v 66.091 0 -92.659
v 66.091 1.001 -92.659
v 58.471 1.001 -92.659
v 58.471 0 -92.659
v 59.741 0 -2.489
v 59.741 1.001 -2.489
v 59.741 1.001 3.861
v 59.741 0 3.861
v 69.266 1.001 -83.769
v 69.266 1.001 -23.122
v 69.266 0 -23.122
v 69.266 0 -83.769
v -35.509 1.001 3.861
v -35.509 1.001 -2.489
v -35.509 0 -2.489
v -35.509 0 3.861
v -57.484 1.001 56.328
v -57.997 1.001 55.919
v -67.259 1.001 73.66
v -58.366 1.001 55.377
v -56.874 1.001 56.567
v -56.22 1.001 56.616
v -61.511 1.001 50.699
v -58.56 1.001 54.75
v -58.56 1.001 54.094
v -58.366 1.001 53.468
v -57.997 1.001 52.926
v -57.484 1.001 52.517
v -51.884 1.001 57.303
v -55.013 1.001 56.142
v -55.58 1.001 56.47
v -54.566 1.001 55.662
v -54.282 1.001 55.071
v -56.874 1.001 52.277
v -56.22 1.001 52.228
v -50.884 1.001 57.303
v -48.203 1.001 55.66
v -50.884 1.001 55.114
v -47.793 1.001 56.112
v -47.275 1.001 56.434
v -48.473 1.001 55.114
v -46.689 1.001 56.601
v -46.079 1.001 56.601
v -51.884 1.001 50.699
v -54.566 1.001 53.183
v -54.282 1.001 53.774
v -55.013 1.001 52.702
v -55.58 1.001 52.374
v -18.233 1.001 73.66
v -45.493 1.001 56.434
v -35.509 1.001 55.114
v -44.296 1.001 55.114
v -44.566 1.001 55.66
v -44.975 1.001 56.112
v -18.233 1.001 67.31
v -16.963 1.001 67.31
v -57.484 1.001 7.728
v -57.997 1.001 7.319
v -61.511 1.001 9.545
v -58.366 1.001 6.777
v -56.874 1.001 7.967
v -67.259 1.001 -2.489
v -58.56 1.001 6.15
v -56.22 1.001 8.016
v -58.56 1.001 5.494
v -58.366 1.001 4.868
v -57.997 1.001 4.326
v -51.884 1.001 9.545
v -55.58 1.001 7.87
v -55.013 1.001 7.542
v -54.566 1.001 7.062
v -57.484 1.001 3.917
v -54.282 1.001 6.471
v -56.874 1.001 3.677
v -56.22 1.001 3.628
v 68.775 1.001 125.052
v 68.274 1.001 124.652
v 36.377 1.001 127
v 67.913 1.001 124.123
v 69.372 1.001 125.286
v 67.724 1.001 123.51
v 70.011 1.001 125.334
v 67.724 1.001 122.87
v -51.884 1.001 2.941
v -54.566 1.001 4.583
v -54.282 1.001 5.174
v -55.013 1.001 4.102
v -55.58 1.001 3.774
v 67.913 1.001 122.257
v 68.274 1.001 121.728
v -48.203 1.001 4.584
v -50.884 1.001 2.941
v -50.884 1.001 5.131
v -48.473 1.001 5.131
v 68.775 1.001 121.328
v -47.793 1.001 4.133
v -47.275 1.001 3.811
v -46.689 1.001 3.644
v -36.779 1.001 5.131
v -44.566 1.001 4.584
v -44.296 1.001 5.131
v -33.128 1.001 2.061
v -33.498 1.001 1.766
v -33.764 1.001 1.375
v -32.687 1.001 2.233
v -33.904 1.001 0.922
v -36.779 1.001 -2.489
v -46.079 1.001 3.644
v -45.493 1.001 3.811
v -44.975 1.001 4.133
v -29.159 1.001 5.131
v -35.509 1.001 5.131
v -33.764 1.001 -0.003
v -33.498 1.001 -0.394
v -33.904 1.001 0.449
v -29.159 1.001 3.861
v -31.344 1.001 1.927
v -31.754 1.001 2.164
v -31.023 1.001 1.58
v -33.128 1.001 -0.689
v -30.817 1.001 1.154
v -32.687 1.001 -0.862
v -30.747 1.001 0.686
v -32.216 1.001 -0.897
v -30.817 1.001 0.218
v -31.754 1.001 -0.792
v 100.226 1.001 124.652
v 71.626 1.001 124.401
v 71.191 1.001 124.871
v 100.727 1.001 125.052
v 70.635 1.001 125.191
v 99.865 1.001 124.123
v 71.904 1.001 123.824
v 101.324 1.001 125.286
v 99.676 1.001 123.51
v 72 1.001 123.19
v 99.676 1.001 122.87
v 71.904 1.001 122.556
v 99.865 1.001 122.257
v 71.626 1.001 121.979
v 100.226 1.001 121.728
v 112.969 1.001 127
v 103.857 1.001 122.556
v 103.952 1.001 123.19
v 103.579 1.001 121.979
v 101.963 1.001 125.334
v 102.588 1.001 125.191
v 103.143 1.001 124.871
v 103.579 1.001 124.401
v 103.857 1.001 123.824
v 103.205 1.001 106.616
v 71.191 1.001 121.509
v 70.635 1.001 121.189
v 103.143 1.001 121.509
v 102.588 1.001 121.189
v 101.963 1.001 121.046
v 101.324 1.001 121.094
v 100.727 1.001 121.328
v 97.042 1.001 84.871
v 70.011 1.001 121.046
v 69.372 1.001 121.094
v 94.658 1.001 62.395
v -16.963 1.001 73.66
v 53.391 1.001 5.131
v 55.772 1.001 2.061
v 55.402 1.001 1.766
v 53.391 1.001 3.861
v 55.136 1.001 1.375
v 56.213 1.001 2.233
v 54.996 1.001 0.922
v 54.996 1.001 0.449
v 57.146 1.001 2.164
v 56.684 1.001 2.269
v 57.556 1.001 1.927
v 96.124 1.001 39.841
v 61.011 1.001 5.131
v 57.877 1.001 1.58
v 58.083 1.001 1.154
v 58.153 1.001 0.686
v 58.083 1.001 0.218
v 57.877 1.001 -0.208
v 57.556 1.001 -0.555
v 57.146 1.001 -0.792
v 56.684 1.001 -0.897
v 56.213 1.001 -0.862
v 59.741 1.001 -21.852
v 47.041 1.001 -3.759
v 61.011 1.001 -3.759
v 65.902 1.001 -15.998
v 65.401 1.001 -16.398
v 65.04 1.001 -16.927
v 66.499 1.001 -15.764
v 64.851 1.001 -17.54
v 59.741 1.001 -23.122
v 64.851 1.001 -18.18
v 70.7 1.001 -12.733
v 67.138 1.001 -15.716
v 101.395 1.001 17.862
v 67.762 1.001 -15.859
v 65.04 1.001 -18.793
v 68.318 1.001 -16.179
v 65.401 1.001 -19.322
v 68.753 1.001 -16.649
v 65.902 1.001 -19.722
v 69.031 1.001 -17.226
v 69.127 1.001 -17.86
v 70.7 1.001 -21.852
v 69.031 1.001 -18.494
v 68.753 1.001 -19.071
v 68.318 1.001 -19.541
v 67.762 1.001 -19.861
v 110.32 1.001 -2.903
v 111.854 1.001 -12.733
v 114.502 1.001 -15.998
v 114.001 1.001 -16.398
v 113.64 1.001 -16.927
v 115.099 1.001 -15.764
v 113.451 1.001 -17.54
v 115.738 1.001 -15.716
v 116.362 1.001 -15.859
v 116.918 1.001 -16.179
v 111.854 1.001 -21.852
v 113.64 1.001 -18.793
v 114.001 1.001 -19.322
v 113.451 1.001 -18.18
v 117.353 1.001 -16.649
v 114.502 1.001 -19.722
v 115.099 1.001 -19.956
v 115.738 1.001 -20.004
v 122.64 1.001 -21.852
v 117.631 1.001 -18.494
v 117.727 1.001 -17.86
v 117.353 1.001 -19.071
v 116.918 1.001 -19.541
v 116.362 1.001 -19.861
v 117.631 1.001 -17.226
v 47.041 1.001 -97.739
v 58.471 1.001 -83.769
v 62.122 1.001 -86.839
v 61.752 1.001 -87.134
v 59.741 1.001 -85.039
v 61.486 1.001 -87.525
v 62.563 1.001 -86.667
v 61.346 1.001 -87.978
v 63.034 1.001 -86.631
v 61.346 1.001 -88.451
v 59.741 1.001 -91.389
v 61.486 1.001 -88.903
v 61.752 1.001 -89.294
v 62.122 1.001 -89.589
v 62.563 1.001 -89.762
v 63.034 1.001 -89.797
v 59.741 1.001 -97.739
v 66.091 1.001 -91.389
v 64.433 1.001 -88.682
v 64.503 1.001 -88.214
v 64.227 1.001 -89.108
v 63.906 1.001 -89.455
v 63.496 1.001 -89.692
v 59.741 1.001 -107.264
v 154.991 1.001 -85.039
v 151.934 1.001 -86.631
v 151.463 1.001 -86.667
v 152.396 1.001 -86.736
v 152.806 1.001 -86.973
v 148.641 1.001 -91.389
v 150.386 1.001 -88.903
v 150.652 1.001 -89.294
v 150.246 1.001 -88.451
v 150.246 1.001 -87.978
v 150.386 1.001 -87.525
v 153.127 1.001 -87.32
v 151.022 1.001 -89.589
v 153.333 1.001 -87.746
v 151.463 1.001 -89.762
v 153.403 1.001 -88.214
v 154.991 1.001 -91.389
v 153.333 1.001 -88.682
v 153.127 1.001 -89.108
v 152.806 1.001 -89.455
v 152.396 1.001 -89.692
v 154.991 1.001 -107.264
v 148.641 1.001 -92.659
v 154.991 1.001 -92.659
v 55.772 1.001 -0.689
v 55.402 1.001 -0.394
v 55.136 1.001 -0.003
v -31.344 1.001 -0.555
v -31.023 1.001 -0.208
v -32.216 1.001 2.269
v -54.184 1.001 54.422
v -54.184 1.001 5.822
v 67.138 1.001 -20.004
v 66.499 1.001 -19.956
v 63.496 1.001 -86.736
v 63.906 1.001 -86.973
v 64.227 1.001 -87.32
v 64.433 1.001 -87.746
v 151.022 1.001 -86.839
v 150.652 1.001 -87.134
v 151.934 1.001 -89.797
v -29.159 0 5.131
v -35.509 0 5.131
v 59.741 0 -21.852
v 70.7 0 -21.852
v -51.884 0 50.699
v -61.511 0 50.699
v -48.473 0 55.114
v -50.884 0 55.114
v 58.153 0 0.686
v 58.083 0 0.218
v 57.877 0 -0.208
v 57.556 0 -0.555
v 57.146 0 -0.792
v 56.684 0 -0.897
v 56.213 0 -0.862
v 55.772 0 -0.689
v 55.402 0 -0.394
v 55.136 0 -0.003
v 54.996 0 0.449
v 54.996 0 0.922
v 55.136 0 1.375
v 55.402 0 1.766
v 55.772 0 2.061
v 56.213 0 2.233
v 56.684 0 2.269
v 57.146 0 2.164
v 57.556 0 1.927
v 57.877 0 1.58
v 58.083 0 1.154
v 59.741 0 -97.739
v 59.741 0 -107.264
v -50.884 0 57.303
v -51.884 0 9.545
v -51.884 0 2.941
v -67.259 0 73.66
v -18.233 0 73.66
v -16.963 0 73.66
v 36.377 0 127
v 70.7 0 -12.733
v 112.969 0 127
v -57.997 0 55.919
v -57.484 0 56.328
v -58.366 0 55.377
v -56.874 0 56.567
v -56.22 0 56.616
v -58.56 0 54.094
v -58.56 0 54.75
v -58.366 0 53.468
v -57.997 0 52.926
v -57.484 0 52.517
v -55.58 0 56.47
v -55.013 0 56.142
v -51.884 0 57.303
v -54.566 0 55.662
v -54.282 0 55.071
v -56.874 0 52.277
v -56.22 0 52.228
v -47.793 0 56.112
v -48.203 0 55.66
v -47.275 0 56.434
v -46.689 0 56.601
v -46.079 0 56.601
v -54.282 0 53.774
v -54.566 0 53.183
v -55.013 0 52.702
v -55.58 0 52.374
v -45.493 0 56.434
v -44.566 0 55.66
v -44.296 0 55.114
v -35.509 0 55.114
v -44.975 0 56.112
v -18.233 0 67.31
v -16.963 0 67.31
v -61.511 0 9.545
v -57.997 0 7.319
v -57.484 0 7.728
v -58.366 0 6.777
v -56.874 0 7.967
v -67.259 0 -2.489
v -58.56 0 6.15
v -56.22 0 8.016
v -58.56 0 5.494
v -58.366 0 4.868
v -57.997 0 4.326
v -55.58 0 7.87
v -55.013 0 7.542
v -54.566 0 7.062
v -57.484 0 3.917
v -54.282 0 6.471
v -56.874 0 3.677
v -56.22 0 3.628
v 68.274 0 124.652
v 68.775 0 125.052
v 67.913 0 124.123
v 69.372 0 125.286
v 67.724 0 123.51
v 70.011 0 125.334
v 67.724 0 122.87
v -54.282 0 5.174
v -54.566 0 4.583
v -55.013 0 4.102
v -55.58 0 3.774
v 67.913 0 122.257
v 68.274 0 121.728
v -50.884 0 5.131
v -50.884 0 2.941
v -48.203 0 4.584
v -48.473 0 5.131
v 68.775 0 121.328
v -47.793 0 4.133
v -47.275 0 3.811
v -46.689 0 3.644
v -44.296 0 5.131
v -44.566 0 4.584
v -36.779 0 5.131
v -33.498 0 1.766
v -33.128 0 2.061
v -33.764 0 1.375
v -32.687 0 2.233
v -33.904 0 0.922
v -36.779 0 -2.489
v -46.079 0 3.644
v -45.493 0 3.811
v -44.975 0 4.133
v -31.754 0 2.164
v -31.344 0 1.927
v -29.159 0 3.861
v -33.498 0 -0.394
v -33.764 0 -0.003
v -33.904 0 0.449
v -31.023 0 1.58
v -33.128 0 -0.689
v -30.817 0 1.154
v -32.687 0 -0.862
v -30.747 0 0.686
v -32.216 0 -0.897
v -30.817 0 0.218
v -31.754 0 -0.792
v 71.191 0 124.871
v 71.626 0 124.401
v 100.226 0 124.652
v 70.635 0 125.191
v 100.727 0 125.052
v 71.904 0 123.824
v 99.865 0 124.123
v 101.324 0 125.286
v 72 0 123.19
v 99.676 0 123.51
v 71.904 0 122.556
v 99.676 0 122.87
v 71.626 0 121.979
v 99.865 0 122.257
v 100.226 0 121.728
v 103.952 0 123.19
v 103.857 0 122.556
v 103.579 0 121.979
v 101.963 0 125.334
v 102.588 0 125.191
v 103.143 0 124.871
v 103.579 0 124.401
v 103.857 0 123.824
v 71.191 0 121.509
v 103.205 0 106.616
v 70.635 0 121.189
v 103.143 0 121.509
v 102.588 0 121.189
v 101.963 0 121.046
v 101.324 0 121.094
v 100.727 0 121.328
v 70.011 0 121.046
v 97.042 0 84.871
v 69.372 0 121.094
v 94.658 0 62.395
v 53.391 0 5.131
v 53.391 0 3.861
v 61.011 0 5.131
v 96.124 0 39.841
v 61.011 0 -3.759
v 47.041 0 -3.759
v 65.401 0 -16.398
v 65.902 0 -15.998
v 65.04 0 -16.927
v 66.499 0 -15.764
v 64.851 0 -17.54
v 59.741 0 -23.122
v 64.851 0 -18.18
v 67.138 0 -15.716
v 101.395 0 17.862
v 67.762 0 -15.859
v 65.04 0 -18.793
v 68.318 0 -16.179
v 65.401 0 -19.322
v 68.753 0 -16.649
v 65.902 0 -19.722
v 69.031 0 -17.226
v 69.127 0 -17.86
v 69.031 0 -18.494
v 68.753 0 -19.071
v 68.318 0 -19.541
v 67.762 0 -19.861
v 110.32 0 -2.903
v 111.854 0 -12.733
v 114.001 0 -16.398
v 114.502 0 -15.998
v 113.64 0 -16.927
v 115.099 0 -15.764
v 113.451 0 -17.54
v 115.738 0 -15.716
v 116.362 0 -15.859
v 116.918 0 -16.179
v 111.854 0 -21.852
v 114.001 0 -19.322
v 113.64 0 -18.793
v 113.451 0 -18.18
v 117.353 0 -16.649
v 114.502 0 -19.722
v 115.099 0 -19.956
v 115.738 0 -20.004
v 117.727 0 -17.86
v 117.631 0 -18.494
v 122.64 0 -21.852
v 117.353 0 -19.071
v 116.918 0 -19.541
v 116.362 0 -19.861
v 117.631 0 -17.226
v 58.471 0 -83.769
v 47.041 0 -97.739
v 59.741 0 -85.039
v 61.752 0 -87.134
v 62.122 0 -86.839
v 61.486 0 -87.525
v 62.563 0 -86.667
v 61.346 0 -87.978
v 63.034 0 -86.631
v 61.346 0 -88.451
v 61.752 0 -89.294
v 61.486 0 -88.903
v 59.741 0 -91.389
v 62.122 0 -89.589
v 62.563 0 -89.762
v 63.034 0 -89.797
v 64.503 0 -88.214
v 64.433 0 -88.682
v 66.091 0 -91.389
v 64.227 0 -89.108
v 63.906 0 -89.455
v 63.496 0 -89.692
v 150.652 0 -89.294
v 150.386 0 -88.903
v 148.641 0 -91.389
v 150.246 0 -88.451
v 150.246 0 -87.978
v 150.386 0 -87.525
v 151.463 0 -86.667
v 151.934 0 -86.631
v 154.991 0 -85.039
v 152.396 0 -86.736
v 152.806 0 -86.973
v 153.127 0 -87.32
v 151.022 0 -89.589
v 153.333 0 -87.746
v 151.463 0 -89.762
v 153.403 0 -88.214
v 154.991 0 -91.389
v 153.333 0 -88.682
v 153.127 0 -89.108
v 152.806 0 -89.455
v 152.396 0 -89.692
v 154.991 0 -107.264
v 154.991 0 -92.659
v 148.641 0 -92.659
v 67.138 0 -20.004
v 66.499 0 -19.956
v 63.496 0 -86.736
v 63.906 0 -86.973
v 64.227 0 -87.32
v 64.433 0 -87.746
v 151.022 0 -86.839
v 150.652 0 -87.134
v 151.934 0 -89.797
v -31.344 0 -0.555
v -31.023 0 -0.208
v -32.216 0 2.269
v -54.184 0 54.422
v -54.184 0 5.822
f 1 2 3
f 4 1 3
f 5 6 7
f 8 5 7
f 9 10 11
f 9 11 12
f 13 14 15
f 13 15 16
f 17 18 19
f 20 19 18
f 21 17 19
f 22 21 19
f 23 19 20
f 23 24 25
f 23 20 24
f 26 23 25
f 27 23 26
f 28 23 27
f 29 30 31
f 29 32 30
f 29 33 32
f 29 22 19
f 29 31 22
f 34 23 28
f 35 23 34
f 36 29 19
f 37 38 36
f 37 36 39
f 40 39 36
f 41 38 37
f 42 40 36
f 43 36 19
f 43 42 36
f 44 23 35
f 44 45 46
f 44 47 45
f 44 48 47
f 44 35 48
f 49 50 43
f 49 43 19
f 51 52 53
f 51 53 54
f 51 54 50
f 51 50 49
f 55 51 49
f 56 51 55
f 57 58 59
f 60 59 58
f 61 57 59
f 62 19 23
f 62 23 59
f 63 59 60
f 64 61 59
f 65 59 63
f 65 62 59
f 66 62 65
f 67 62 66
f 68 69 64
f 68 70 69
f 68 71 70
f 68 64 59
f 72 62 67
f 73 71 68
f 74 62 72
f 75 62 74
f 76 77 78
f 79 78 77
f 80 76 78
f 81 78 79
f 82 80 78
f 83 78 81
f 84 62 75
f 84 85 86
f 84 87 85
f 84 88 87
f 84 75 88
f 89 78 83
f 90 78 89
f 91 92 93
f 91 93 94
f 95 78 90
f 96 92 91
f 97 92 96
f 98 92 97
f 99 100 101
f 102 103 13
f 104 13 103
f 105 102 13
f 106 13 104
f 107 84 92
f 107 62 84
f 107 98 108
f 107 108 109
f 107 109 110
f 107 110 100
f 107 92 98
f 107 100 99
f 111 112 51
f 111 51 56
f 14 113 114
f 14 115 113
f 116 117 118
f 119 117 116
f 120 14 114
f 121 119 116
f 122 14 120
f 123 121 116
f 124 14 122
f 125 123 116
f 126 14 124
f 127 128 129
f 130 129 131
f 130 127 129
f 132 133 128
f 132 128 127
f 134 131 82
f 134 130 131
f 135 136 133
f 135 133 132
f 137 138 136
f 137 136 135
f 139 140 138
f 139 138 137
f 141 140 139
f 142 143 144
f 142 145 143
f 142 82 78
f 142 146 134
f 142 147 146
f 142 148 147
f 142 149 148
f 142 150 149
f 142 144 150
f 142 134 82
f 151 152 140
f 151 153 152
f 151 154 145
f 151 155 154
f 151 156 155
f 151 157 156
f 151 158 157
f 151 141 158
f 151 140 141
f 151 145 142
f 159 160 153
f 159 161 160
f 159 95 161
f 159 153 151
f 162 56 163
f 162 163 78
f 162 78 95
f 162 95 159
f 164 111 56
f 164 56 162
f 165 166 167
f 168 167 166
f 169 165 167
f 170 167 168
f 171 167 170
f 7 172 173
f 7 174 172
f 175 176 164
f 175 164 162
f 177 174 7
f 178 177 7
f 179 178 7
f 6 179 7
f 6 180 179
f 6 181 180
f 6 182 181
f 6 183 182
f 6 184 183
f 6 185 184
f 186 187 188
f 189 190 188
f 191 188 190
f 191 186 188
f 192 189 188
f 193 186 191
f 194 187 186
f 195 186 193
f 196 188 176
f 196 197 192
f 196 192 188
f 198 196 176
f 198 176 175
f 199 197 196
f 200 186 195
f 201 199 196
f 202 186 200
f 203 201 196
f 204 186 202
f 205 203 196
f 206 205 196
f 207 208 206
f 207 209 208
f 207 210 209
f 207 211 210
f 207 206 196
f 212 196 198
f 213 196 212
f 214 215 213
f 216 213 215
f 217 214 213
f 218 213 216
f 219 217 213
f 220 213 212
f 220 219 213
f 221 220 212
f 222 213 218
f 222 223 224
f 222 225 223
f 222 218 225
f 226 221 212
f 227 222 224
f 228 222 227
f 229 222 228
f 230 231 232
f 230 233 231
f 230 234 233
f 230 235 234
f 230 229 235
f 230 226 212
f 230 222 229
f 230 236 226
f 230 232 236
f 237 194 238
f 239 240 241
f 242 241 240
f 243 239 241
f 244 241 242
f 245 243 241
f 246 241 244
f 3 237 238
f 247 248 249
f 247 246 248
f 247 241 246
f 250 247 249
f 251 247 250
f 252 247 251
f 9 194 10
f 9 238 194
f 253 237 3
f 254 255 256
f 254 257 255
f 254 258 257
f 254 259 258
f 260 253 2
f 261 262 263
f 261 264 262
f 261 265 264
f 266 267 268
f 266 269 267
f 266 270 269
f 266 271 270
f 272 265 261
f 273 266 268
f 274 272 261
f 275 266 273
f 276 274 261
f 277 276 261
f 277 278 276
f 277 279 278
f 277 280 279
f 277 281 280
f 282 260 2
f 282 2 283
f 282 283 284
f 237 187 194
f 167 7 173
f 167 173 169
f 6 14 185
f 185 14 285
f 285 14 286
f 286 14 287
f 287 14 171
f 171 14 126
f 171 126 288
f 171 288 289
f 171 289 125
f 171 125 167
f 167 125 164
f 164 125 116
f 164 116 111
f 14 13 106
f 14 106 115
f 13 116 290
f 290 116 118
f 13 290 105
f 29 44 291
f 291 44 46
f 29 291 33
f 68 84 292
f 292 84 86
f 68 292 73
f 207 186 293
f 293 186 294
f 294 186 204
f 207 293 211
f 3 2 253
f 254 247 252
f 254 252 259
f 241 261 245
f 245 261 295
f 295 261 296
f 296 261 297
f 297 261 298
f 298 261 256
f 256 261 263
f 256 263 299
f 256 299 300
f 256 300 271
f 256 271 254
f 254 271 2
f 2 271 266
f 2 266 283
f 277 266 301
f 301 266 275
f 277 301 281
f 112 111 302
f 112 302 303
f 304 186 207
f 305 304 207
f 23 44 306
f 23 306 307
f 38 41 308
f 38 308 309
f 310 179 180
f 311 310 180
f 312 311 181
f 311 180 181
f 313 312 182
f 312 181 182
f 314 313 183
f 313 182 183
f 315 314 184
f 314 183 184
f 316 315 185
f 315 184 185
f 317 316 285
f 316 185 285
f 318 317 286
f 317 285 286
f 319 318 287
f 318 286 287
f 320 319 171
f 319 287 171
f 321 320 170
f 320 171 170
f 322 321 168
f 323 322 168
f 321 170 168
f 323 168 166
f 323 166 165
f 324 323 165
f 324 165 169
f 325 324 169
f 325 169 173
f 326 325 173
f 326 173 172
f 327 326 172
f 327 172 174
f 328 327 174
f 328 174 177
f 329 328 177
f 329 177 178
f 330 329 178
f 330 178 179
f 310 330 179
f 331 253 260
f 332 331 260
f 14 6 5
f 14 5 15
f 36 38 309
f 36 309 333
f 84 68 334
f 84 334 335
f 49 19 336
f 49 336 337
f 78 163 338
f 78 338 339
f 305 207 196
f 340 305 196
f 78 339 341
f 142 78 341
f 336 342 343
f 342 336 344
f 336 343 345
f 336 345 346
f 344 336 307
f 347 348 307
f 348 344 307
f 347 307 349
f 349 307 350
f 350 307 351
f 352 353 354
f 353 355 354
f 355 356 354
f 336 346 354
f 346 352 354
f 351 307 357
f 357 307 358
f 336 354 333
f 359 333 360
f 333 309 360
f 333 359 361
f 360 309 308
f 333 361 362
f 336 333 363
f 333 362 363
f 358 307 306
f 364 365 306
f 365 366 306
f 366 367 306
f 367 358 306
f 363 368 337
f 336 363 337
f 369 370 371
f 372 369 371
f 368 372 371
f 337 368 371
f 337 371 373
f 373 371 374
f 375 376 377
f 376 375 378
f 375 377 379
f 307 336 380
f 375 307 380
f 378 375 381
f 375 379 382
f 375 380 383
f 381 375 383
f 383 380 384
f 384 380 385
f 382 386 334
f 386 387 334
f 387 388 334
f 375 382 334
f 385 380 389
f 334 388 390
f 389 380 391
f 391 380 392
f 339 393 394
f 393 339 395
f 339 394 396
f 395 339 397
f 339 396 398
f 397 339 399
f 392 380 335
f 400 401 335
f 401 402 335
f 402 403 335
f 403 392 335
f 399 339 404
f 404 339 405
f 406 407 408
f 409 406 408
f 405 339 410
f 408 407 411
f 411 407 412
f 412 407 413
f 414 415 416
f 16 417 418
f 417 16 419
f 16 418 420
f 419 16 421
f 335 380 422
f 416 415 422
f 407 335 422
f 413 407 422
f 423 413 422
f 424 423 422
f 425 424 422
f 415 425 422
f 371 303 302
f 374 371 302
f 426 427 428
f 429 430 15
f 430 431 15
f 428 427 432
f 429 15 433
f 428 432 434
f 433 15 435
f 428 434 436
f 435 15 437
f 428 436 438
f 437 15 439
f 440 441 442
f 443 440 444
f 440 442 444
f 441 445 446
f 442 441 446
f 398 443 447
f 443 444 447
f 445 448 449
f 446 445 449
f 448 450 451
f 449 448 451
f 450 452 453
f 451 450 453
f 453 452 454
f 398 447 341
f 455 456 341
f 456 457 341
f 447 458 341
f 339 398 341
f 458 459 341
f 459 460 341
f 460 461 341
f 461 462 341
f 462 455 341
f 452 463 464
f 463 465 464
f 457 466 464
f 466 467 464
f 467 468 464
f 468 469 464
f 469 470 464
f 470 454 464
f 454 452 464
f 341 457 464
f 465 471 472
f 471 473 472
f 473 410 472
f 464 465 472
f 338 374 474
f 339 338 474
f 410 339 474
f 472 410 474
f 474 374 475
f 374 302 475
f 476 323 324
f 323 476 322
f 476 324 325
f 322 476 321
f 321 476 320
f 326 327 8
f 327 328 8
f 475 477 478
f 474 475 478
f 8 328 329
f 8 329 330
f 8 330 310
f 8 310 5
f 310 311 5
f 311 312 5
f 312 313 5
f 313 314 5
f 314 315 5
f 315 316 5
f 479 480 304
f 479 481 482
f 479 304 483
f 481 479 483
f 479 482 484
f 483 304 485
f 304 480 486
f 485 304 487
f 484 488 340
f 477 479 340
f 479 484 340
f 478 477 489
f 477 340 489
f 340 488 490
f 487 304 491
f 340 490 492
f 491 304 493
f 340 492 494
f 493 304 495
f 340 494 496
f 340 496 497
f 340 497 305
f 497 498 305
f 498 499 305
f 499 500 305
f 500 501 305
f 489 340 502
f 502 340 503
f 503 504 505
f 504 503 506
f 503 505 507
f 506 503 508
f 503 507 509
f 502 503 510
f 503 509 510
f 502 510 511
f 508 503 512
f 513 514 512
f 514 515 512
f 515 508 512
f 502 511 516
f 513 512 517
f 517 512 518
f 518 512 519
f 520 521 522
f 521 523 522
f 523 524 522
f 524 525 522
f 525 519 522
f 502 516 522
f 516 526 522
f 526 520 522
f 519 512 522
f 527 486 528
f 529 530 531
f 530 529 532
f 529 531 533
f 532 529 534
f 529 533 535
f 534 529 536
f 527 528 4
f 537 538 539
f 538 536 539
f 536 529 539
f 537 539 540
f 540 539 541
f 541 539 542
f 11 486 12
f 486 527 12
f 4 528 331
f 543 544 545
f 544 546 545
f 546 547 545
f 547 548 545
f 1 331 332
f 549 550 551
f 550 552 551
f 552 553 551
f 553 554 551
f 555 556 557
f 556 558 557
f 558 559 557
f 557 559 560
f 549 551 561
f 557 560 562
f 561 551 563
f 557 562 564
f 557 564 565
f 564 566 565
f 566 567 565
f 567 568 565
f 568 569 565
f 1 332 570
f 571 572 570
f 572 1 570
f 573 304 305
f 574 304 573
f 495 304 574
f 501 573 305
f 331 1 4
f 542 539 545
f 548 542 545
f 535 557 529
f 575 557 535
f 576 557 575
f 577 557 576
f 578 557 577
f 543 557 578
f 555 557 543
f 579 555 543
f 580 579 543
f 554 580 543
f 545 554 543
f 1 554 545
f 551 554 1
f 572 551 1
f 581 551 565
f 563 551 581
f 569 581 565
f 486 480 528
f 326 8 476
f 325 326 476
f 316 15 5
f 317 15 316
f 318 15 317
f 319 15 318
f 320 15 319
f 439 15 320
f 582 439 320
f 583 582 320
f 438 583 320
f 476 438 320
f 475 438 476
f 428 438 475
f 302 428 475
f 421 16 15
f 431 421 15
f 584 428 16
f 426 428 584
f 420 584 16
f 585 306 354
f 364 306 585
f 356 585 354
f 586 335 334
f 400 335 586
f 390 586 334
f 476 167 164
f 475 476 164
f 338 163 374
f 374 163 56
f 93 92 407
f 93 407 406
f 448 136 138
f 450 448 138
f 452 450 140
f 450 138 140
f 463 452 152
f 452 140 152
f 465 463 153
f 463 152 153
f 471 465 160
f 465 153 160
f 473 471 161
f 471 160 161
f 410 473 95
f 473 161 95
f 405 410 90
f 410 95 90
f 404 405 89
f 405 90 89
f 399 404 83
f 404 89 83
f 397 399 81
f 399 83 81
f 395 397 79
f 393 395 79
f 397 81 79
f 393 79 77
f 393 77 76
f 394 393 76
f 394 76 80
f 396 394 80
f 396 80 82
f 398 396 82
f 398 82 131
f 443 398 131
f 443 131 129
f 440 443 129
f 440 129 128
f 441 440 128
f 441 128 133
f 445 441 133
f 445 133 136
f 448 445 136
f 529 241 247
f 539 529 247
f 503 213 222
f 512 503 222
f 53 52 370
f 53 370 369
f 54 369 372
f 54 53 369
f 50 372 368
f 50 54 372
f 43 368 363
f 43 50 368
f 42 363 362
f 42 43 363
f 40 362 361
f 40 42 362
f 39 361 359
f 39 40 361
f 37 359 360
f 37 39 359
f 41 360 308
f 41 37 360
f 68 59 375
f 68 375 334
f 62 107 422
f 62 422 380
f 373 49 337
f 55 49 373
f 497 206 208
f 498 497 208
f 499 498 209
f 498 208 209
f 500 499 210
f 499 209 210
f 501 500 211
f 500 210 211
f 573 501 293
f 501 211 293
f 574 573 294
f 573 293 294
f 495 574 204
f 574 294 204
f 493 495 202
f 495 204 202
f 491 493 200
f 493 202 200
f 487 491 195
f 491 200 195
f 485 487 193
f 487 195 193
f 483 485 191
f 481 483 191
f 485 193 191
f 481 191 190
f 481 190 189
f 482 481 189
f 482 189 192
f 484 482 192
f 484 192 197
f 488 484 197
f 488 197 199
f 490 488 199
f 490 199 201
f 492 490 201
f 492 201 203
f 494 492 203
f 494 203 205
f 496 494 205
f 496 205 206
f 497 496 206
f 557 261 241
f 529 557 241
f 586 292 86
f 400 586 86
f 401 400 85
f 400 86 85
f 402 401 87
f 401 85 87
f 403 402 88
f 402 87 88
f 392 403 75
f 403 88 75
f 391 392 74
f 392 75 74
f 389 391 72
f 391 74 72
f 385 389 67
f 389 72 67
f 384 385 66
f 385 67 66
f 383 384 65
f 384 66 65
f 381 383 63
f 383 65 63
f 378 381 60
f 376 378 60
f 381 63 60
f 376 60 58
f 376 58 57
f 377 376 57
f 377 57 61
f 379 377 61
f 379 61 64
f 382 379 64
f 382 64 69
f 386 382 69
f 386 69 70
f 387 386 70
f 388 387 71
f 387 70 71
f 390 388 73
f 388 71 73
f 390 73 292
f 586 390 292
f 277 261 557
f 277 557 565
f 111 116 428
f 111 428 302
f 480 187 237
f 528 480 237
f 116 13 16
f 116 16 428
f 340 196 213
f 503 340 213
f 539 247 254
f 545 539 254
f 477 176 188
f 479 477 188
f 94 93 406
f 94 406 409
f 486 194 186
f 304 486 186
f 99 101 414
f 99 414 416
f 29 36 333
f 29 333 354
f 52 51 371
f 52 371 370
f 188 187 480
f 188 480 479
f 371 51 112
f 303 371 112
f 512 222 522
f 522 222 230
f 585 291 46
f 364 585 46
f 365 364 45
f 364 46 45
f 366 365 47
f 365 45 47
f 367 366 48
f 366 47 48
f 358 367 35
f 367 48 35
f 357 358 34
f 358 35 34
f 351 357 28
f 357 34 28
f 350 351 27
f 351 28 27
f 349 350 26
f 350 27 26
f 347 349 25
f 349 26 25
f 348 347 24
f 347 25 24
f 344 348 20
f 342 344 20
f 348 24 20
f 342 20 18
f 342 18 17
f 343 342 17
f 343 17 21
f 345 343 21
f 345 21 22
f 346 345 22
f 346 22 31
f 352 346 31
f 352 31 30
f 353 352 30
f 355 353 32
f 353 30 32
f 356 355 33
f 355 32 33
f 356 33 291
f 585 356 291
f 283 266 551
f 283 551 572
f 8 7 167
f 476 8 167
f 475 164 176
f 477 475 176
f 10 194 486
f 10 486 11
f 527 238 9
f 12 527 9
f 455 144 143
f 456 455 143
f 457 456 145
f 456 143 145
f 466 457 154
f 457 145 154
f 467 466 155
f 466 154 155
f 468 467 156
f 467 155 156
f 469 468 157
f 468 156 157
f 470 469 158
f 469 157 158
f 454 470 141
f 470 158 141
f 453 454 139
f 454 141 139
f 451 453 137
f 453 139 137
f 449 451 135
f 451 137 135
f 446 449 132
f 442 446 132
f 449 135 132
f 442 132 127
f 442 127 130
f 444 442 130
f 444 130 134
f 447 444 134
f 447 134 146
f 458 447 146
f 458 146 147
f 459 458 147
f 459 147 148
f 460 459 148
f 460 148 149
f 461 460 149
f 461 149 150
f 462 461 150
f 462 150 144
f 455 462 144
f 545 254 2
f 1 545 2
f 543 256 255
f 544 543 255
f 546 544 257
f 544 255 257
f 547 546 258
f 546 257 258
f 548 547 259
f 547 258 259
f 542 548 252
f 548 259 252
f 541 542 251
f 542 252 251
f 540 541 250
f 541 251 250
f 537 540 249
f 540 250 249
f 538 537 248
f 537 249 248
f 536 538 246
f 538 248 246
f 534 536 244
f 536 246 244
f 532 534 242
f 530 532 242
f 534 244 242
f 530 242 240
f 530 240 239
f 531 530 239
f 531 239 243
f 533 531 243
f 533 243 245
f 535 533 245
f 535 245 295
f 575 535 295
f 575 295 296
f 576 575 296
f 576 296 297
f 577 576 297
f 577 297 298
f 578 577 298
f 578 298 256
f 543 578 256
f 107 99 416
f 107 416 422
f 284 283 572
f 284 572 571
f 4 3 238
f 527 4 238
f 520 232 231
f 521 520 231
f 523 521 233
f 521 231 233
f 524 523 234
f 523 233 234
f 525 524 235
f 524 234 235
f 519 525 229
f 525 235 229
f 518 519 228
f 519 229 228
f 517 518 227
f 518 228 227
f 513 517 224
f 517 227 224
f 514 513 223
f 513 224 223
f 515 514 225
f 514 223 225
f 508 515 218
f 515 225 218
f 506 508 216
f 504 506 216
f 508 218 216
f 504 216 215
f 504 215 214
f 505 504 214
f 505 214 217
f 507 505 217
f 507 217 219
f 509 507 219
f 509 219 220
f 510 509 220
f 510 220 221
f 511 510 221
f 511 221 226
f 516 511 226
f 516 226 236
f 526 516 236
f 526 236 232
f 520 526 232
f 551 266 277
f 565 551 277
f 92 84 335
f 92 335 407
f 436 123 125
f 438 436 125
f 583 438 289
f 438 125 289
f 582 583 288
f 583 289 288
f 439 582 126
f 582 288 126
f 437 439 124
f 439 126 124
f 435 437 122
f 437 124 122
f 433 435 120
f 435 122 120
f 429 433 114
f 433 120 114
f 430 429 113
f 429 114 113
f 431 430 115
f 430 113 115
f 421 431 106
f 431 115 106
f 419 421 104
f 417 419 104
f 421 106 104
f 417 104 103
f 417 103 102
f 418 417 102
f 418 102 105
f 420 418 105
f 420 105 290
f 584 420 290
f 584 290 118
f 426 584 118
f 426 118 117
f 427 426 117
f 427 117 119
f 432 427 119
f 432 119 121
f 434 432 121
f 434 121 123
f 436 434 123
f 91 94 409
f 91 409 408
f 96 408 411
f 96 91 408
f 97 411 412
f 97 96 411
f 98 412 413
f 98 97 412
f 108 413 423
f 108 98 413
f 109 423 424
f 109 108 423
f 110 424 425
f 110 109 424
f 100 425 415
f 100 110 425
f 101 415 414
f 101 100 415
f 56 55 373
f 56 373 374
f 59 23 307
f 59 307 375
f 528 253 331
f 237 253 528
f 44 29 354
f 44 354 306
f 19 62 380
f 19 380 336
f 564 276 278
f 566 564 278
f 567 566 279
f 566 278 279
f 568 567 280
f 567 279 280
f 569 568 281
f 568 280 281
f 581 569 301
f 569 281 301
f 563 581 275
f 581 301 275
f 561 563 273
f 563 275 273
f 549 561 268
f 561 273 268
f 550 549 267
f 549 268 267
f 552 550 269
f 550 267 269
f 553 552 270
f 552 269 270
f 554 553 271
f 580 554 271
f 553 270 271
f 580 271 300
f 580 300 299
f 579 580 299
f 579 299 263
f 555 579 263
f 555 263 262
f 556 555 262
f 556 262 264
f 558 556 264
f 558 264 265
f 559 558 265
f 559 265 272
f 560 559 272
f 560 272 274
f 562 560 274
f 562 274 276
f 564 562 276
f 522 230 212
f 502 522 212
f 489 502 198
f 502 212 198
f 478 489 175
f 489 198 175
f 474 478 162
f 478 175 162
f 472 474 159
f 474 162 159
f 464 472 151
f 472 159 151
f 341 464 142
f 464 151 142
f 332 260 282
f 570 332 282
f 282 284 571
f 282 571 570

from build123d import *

# Parameters (mm, degrees)
SKETCH2_W                    = 254
SKETCH2_H                    = 254
BOSS_EXTRUDE1_DEPTH          = 1.00076
SKETCH3_W                    = 69.85
SKETCH3_H                    = 25.4
CUT_EXTRUDE1_DEPTH           = 1
CUT_EXTRUDE1_DEPTH_BACK      = 2.00076
CUT_EXTRUDE2_DEPTH           = 1
CUT_EXTRUDE2_DEPTH_BACK      = 2.00076
SKETCH5_R                    = 2.150000018
CUT_EXTRUDE3_DEPTH           = 1
CUT_EXTRUDE3_DEPTH_BACK      = 2.00076
SKETCH6_R                    = 2.099999991
CUT_EXTRUDE4_DEPTH           = 1
CUT_EXTRUDE4_DEPTH_BACK      = 2.00076
SKETCH7_W                    = 95.25
SKETCH7_H                    = 95.25
CUT_EXTRUDE5_DEPTH           = 1
CUT_EXTRUDE5_DEPTH_BACK      = 2.00076
CUT_EXTRUDE6_DEPTH           = 1
CUT_EXTRUDE6_DEPTH_BACK      = 2.00076
BOSS_EXTRUDE4_DEPTH          = 1.00076
SKETCH18_W                   = 12.7
SKETCH18_H                   = 1.27
CUT_EXTRUDE_THIN4_DEPTH      = 1
CUT_EXTRUDE_THIN4_DEPTH_BACK = 2.00076
CUT_EXTRUDE7_DEPTH           = 1
CUT_EXTRUDE7_DEPTH_BACK      = 2.00076
SKETCH10_W                   = 9.525
SKETCH10_H                   = 60.6472
SKETCH10_W_2                 = 95.25
SKETCH10_H_2                 = 9.525
BOSS_EXTRUDE2_DEPTH          = 1.00076
SKETCH14_R                   = 2.200000045
BOSS_EXTRUDE3_DEPTH          = 1.00076
SKETCH15_W                   = 1.27
SKETCH15_H                   = 6.35
CUT_EXTRUDE_THIN3_DEPTH      = 1
CUT_EXTRUDE_THIN3_DEPTH_BACK = 2.00076
SKETCH19_R                   = 1.5875
CUT_EXTRUDE8_DEPTH           = 1
CUT_EXTRUDE8_DEPTH_BACK      = 2.00076
SKETCH20_W                   = 1.27
SKETCH20_H                   = 1.27
SKETCH20_W_2                 = 6.35
CUT_EXTRUDE12_DEPTH          = 1
CUT_EXTRUDE12_DEPTH_BACK     = 2.00076


with BuildPart() as part:
    # Sketch2 → Boss-Extrude1 (new body)
    with BuildSketch(Plane(origin=(0, 0, 0), x_dir=(1, 0, 0), z_dir=(0, 1, 0))):
        Rectangle(SKETCH2_W, SKETCH2_H)
    extrude(amount=BOSS_EXTRUDE1_DEPTH)

    # Sketch3 → Cut-Extrude1 (cut, two sides)
    with BuildSketch(Plane(origin=(0, 1.00076, 0), x_dir=(1, 0, 0), z_dir=(0, 1, 0))) as cut_extrude1_sk:
        with Locations((92.075, 34.552)):
            Rectangle(SKETCH3_W, SKETCH3_H)
    extrude(amount=CUT_EXTRUDE1_DEPTH, mode=Mode.SUBTRACT)
    extrude(cut_extrude1_sk.sketch, amount=-CUT_EXTRUDE1_DEPTH_BACK, mode=Mode.SUBTRACT)

    # Sketch4 → Cut-Extrude2 (cut, two sides)
    with BuildSketch(Plane(origin=(0, 1.00076, 0), x_dir=(1, 0, 0), z_dir=(0, 1, 0))) as cut_extrude2_sk:
        with BuildLine():
            Line((127, -127), (127, 21.852))
            Line((127, 21.852), (122.640015225, 21.852))
            ThreePointArc((122.640015225, 21.852), (94.909945844, -51.086516198), (112.96892893, -127))
            Line((112.96892893, -127), (127, -127))
        make_face()
    extrude(amount=CUT_EXTRUDE2_DEPTH, mode=Mode.SUBTRACT)
    extrude(cut_extrude2_sk.sketch, amount=-CUT_EXTRUDE2_DEPTH_BACK, mode=Mode.SUBTRACT)

    # Sketch5 → Cut-Extrude3 (cut, two sides)
    with BuildSketch(Plane(origin=(0, 1.00076, 0), x_dir=(1, 0, 0), z_dir=(0, 1, 0))) as cut_extrude3_sk:
        with Locations((69.85, -123.19)):
            Circle(SKETCH5_R)
        with Locations((101.802396213, -123.19)):
            Circle(SKETCH5_R)
        with Locations((66.977000031, 17.859999967)):
            Circle(SKETCH5_R)
        with Locations((115.577000113, 17.859999967)):
            Circle(SKETCH5_R)
    extrude(amount=CUT_EXTRUDE3_DEPTH, mode=Mode.SUBTRACT)
    extrude(cut_extrude3_sk.sketch, amount=-CUT_EXTRUDE3_DEPTH_BACK, mode=Mode.SUBTRACT)

    # Sketch6 → Cut-Extrude4 (cut, two sides)
    with BuildSketch(Plane(origin=(0, 1.00076, 0), x_dir=(1, 0, 0), z_dir=(0, 1, 0))) as cut_extrude4_sk:
        with Locations((66.977000031, 27.860000033)):
            Circle(SKETCH6_R)
        with Locations((66.977000031, 17.859999967)):
            Circle(SKETCH6_R)
        with Locations((115.577000113, 27.860000033)):
            Circle(SKETCH6_R)
        with Locations((115.577000113, 17.859999967)):
            Circle(SKETCH6_R)
        Polygon((70.700000078, 22.36), (70.700000078, 12.733000061), (111.854000066, 12.733000061), (111.854000066, 22.36), (118.458000066, 22.36), (118.458000066, 23.36), (111.854000066, 23.36), (111.854000066, 32.986999939), (70.700000078, 32.986999939), (70.700000078, 23.36), (64.096000078, 23.36), (64.096000078, 22.36), align=None)
    extrude(amount=CUT_EXTRUDE4_DEPTH, mode=Mode.SUBTRACT)
    extrude(cut_extrude4_sk.sketch, amount=-CUT_EXTRUDE4_DEPTH_BACK, mode=Mode.SUBTRACT)

    # Sketch7 → Cut-Extrude5 (cut, two sides)
    with BuildSketch(Plane(origin=(0, 1.00076, 0), x_dir=(1, 0, 0), z_dir=(0, 1, 0))) as cut_extrude5_sk:
        with Locations((12.1158, 50.1142)):
            Rectangle(SKETCH7_W, SKETCH7_H)
    extrude(amount=CUT_EXTRUDE5_DEPTH, mode=Mode.SUBTRACT)
    extrude(cut_extrude5_sk.sketch, amount=-CUT_EXTRUDE5_DEPTH_BACK, mode=Mode.SUBTRACT)

    # Sketch8 → Cut-Extrude6 (cut, two sides)
    with BuildSketch(Plane(origin=(0, 1.00076, 0), x_dir=(1, 0, 0), z_dir=(0, 1, 0))) as cut_extrude6_sk:
        Polygon((127, 47.252), (127, 127), (-127, 127), (-127, -127), (-35.5092, -127), (-35.5092, 47.252), align=None)
    extrude(amount=CUT_EXTRUDE6_DEPTH, mode=Mode.SUBTRACT)
    extrude(cut_extrude6_sk.sketch, amount=-CUT_EXTRUDE6_DEPTH_BACK, mode=Mode.SUBTRACT)

    # Sketch17 → Boss-Extrude4 (add)
    with BuildSketch(Plane(origin=(0, 1.00076, 0), x_dir=(1, 0, 0), z_dir=(0, 1, 0))):
        Polygon((59.7408, 2.4892), (47.0408, 2.4892), (47.0408, 97.7392), (59.7408, 97.7392), (154.9908, 97.7392), (154.9908, 85.0392), (59.7408, 85.0392), align=None)
    extrude(amount=-BOSS_EXTRUDE4_DEPTH)

    # Sketch18 → Cut-Extrude-Thin4 (cut, two sides)
    with BuildSketch(Plane(origin=(0, 1.00076, 0), x_dir=(1, 0, 0), z_dir=(0, 1, 0))) as cut_extrude_thin4_sk:
        with Locations((53.3908, 3.1242)):
            Rectangle(SKETCH18_W, SKETCH18_H)
    extrude(amount=CUT_EXTRUDE_THIN4_DEPTH, mode=Mode.SUBTRACT)
    extrude(cut_extrude_thin4_sk.sketch, amount=-CUT_EXTRUDE_THIN4_DEPTH_BACK, mode=Mode.SUBTRACT)

    # Sketch9 → Cut-Extrude7 (cut, two sides)
    with BuildSketch(Plane(origin=(0, 1.00076, 0), x_dir=(1, 0, 0), z_dir=(0, 1, 0))) as cut_extrude7_sk:
        Polygon((-35.5092, -55.113847322), (36.376952678, -127), (-35.5092, -127), align=None)
    extrude(amount=CUT_EXTRUDE7_DEPTH, mode=Mode.SUBTRACT)
    extrude(cut_extrude7_sk.sketch, amount=-CUT_EXTRUDE7_DEPTH_BACK, mode=Mode.SUBTRACT)

    # Sketch10 → Boss-Extrude2 (add)
    with BuildSketch(Plane(origin=(0, 1.00076, 0), x_dir=(1, 0, 0), z_dir=(0, 1, 0))):
        with Locations((64.5033, 53.4456)):
            Rectangle(SKETCH10_W, SKETCH10_H)
        with Locations((107.3658, 102.5017)):
            Rectangle(SKETCH10_W_2, SKETCH10_H_2)
    extrude(amount=-BOSS_EXTRUDE2_DEPTH)

    # Sketch14 → Boss-Extrude3 (add)
    with BuildSketch(Plane(origin=(0, 1.00076, 0), x_dir=(1, 0, 0), z_dir=(0, 1, 0))):
        with BuildLine():
            Line((-61.511199939, -50.699323655), (-61.511199939, -9.545323667))
            Line((-61.511199939, -9.545323667), (-51.8842, -9.545323667))
            Line((-51.8842, -9.545323667), (-51.8842, -2.941323667))
            Line((-51.8842, -2.941323667), (-50.8842, -2.941323667))
            Line((-50.8842, -2.941323667), (-50.8842, -5.1308))
            Line((-50.8842, -5.1308), (-48.472691116, -5.1308))
            ThreePointArc((-48.472691116, -5.1308), (-46.384199967, -3.622323575), (-44.295708818, -5.1308))
            Line((-44.295708818, -5.1308), (-35.5092, -5.1308))
            Line((-35.5092, -5.1308), (-35.5092, 2.4892))
            Line((-35.5092, 2.4892), (-67.2592, 2.4892))
            Line((-67.2592, 2.4892), (-67.2592, -73.66))
            Line((-67.2592, -73.66), (-16.963047322, -73.66))
            Line((-16.963047322, -73.66), (-35.5092, -55.113847322))
            Line((-35.5092, -55.113847322), (-44.295708818, -55.113847322))
            ThreePointArc((-44.295708818, -55.113847322), (-46.384199967, -56.622323747), (-48.472691116, -55.113847322))
            Line((-48.472691116, -55.113847322), (-50.8842, -55.113847322))
            Line((-50.8842, -55.113847322), (-50.8842, -57.303323655))
            Line((-50.8842, -57.303323655), (-51.8842, -57.303323655))
            Line((-51.8842, -57.303323655), (-51.8842, -50.699323655))
            Line((-51.8842, -50.699323655), (-61.511199939, -50.699323655))
        make_face()
        with Locations((-56.384200033, -54.422323702)):
            Circle(SKETCH14_R, mode=Mode.SUBTRACT)
        with Locations((-56.384200033, -5.82232362)):
            Circle(SKETCH14_R, mode=Mode.SUBTRACT)
    extrude(amount=-BOSS_EXTRUDE3_DEPTH)

    # Sketch15 → Cut-Extrude-Thin3 (cut, two sides)
    with BuildSketch(Plane(origin=(0, 1.00076, 0), x_dir=(1, 0, 0), z_dir=(0, 1, 0))) as cut_extrude_thin3_sk:
        with Locations((-17.598047322, -70.485)):
            Rectangle(SKETCH15_W, SKETCH15_H)
    extrude(amount=CUT_EXTRUDE_THIN3_DEPTH, mode=Mode.SUBTRACT)
    extrude(cut_extrude_thin3_sk.sketch, amount=-CUT_EXTRUDE_THIN3_DEPTH_BACK, mode=Mode.SUBTRACT)

    # Sketch19 → Cut-Extrude8 (cut, two sides)
    with BuildSketch(Plane(origin=(0, 1.00076, 0), x_dir=(1, 0, 0), z_dir=(0, 1, 0))) as cut_extrude8_sk:
        with Locations((56.5658, -0.6858)):
            Circle(SKETCH19_R)
        with Locations((-32.3342, -0.6858)):
            Circle(SKETCH19_R)
        with Locations((151.8158, 88.2142)):
            Circle(SKETCH19_R)
        with Locations((62.9158, 88.2142)):
            Circle(SKETCH19_R)
    extrude(amount=CUT_EXTRUDE8_DEPTH, mode=Mode.SUBTRACT)
    extrude(cut_extrude8_sk.sketch, amount=-CUT_EXTRUDE8_DEPTH_BACK, mode=Mode.SUBTRACT)

    # Sketch20 → Cut-Extrude12 (cut, two sides)
    with BuildSketch(Plane(origin=(0, 1.00076, 0), x_dir=(1, 0, 0), z_dir=(0, 1, 0))) as cut_extrude12_sk:
        with Locations((59.1058, 84.4042)):
            Rectangle(SKETCH20_W, SKETCH20_H)
        Polygon((59.7408, 91.3892), (66.0908, 91.3892), (66.0908, 92.6592), (58.4708, 92.6592), (58.4708, 85.0392), (59.7408, 85.0392), align=None)
        with Locations((60.3758, 3.1242)):
            Rectangle(SKETCH20_W, SKETCH20_H)
        Polygon((59.7408, -3.8608), (53.3908, -3.8608), (53.3908, -5.1308), (61.0108, -5.1308), (61.0108, 2.4892), (59.7408, 2.4892), align=None)
        Polygon((-29.1592, -3.8608), (-29.1592, -5.1308), (-36.7792, -5.1308), (-36.7792, 2.4892), (-35.5092, 2.4892), (-35.5092, -3.8608), align=None)
        with Locations((151.8158, 92.0242)):
            Rectangle(SKETCH20_W_2, SKETCH20_H)
    extrude(amount=CUT_EXTRUDE12_DEPTH, mode=Mode.SUBTRACT)
    extrude(cut_extrude12_sk.sketch, amount=-CUT_EXTRUDE12_DEPTH_BACK, mode=Mode.SUBTRACT)


solid = part.part
